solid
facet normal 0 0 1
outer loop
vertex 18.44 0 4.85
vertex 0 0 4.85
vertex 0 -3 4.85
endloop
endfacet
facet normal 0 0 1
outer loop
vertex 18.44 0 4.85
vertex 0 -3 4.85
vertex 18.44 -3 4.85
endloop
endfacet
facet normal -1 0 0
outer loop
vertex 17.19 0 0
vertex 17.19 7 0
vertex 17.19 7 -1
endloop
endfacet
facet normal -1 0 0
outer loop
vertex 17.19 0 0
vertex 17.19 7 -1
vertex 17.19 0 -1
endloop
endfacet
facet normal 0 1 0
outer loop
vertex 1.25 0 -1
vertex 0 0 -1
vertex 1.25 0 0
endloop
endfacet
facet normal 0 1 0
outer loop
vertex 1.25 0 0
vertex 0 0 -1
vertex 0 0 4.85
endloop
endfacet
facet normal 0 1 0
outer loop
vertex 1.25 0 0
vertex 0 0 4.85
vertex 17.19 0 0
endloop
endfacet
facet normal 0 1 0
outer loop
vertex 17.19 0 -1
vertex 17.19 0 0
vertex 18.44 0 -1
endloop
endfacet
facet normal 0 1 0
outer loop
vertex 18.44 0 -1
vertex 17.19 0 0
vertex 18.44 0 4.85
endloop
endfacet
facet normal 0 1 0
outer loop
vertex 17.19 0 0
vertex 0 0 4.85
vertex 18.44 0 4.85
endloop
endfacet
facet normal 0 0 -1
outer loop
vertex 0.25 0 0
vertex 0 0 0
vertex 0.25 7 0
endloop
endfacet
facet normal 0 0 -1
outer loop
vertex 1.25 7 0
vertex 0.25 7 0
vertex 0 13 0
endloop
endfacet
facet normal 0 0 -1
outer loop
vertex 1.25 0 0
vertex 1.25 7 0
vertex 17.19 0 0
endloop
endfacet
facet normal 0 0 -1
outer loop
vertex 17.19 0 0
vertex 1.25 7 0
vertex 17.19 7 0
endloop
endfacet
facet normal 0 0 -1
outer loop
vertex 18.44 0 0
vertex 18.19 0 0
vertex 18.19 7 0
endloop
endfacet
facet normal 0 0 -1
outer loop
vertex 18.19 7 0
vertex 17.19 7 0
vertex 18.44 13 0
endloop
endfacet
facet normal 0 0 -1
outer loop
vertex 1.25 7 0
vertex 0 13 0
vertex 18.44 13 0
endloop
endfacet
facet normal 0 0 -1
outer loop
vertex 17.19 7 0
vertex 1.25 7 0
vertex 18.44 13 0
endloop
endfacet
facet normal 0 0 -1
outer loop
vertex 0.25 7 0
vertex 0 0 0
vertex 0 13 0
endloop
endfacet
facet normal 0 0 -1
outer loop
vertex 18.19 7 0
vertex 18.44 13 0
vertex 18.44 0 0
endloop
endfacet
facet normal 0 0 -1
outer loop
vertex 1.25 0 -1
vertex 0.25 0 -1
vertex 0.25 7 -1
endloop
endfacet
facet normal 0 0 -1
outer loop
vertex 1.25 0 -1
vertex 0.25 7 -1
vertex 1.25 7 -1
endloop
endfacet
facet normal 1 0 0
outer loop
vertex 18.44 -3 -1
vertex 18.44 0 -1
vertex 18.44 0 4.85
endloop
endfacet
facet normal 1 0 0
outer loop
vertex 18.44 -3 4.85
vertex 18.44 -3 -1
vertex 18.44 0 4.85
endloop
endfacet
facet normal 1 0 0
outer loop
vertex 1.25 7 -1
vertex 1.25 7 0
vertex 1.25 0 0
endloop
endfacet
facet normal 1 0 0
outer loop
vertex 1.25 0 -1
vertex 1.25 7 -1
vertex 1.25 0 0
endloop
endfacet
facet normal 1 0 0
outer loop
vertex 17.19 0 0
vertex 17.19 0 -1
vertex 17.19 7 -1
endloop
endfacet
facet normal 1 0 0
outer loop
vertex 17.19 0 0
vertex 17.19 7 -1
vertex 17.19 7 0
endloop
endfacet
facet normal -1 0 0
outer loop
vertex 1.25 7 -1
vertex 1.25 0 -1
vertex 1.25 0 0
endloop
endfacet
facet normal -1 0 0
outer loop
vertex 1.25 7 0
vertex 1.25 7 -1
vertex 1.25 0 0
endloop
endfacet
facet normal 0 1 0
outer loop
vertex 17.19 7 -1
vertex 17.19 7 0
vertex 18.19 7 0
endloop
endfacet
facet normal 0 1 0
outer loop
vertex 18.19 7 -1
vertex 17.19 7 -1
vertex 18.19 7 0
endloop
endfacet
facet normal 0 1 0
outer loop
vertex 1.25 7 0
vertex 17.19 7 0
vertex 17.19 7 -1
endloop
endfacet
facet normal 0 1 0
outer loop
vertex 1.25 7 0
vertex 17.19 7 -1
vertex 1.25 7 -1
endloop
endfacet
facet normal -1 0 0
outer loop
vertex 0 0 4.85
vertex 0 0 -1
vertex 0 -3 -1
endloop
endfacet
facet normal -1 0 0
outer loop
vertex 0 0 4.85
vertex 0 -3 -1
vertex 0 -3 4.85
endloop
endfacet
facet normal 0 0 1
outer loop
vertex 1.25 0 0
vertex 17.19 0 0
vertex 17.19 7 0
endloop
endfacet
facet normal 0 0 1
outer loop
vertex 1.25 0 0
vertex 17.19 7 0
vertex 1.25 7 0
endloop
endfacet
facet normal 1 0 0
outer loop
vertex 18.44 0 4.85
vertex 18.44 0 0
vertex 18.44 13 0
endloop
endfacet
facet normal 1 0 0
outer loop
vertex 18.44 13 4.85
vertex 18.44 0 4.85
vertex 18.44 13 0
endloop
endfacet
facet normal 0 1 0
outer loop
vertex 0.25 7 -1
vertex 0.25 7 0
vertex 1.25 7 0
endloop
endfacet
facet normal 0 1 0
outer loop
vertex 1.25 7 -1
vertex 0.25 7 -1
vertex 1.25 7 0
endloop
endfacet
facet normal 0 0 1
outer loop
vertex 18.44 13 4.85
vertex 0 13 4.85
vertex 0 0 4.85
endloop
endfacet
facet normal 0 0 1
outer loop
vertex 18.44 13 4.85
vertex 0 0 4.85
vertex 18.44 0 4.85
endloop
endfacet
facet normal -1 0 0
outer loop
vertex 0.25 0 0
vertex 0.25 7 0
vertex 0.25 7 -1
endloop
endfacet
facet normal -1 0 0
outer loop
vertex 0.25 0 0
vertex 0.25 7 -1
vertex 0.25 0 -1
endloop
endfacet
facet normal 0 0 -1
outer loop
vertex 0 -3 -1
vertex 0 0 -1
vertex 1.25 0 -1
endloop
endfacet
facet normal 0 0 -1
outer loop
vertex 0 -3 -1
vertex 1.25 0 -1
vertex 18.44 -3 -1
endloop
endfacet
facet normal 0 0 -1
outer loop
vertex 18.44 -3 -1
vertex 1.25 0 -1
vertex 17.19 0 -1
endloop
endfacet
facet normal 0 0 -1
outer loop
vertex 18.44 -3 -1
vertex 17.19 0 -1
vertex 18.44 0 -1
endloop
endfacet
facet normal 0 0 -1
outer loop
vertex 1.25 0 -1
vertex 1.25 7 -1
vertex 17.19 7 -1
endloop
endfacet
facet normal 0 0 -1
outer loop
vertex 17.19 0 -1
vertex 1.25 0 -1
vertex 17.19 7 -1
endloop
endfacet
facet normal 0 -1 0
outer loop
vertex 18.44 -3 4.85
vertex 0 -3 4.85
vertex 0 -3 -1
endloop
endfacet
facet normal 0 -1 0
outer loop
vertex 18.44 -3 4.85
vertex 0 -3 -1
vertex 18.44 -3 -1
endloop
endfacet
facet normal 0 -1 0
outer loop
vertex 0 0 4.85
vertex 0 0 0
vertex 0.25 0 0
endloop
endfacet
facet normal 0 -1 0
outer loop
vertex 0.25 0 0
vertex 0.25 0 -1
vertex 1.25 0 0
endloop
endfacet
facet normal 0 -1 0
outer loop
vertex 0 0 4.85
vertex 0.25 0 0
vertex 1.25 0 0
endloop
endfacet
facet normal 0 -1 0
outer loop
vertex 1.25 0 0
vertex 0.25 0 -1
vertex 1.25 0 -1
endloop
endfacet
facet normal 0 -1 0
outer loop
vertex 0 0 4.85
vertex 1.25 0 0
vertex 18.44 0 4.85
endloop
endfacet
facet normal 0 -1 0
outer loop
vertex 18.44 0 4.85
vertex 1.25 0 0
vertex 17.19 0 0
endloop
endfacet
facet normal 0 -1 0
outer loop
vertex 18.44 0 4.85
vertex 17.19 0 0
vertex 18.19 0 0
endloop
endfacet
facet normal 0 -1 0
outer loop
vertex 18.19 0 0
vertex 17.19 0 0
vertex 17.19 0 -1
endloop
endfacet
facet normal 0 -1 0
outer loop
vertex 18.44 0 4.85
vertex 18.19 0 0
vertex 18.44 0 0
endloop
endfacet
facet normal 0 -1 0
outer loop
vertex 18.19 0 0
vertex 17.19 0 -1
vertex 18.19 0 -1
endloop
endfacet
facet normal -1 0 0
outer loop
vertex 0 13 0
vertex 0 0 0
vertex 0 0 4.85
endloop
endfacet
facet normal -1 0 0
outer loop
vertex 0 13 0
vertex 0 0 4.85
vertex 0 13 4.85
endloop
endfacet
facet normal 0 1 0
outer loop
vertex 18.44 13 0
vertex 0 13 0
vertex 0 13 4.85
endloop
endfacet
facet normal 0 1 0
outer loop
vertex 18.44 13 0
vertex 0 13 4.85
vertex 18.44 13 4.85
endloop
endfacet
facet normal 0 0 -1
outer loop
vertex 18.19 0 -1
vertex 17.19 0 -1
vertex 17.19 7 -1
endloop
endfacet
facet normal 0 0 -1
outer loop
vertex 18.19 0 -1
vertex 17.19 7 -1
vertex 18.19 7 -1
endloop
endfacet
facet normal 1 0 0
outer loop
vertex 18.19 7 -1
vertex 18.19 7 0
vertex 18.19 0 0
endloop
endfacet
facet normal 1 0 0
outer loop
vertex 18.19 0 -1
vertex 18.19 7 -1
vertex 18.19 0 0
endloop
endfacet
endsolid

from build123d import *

# Parameters (mm, degrees)
F0_W     = 18.44
F0_H     = 13
F1_DEPTH = 4.85
F2_W     = 1
F2_H     = 7
F3_DEPTH = 1
F4_W     = 18.44
F4_H     = 5.85
F5_DEPTH = 3
F6_W     = 15.94
F6_H     = 1
F7_DEPTH = 7


with BuildPart() as f1:
    # F0 (on Top) → F1 (new body)
    with BuildSketch(Plane.XY):
        with Locations((9.22, 6.5)):
            Rectangle(F0_W, F0_H)
    extrude(amount=F1_DEPTH)

    # F2 (on face) → F3 (join)
    with BuildSketch(Plane(origin=(0, 0, 0), x_dir=(1, 0, 0), z_dir=(0, 0, -1))):
        with Locations((0.75, -3.5)):
            Rectangle(F2_W, F2_H)
        with Locations((17.69, -3.5)):
            Rectangle(F2_W, F2_H)
    extrude(amount=F3_DEPTH)


with BuildPart() as f5:
    # F4 (on face) → F5 (new body)
    with BuildSketch(Plane.XZ):
        with Locations((9.22, 1.925)):
            Rectangle(F4_W, F4_H)
    extrude(amount=F5_DEPTH)

    # F6 (on face) → F7 (join, through all)
    with BuildSketch(Plane(origin=(0, 0, 0), x_dir=(-1, 0, 0), z_dir=(0, 1, 0))):
        with Locations((-9.22, -0.5)):
            Rectangle(F6_W, F6_H)
    extrude(amount=F7_DEPTH)


solid = Compound([f1.part, f5.part])
